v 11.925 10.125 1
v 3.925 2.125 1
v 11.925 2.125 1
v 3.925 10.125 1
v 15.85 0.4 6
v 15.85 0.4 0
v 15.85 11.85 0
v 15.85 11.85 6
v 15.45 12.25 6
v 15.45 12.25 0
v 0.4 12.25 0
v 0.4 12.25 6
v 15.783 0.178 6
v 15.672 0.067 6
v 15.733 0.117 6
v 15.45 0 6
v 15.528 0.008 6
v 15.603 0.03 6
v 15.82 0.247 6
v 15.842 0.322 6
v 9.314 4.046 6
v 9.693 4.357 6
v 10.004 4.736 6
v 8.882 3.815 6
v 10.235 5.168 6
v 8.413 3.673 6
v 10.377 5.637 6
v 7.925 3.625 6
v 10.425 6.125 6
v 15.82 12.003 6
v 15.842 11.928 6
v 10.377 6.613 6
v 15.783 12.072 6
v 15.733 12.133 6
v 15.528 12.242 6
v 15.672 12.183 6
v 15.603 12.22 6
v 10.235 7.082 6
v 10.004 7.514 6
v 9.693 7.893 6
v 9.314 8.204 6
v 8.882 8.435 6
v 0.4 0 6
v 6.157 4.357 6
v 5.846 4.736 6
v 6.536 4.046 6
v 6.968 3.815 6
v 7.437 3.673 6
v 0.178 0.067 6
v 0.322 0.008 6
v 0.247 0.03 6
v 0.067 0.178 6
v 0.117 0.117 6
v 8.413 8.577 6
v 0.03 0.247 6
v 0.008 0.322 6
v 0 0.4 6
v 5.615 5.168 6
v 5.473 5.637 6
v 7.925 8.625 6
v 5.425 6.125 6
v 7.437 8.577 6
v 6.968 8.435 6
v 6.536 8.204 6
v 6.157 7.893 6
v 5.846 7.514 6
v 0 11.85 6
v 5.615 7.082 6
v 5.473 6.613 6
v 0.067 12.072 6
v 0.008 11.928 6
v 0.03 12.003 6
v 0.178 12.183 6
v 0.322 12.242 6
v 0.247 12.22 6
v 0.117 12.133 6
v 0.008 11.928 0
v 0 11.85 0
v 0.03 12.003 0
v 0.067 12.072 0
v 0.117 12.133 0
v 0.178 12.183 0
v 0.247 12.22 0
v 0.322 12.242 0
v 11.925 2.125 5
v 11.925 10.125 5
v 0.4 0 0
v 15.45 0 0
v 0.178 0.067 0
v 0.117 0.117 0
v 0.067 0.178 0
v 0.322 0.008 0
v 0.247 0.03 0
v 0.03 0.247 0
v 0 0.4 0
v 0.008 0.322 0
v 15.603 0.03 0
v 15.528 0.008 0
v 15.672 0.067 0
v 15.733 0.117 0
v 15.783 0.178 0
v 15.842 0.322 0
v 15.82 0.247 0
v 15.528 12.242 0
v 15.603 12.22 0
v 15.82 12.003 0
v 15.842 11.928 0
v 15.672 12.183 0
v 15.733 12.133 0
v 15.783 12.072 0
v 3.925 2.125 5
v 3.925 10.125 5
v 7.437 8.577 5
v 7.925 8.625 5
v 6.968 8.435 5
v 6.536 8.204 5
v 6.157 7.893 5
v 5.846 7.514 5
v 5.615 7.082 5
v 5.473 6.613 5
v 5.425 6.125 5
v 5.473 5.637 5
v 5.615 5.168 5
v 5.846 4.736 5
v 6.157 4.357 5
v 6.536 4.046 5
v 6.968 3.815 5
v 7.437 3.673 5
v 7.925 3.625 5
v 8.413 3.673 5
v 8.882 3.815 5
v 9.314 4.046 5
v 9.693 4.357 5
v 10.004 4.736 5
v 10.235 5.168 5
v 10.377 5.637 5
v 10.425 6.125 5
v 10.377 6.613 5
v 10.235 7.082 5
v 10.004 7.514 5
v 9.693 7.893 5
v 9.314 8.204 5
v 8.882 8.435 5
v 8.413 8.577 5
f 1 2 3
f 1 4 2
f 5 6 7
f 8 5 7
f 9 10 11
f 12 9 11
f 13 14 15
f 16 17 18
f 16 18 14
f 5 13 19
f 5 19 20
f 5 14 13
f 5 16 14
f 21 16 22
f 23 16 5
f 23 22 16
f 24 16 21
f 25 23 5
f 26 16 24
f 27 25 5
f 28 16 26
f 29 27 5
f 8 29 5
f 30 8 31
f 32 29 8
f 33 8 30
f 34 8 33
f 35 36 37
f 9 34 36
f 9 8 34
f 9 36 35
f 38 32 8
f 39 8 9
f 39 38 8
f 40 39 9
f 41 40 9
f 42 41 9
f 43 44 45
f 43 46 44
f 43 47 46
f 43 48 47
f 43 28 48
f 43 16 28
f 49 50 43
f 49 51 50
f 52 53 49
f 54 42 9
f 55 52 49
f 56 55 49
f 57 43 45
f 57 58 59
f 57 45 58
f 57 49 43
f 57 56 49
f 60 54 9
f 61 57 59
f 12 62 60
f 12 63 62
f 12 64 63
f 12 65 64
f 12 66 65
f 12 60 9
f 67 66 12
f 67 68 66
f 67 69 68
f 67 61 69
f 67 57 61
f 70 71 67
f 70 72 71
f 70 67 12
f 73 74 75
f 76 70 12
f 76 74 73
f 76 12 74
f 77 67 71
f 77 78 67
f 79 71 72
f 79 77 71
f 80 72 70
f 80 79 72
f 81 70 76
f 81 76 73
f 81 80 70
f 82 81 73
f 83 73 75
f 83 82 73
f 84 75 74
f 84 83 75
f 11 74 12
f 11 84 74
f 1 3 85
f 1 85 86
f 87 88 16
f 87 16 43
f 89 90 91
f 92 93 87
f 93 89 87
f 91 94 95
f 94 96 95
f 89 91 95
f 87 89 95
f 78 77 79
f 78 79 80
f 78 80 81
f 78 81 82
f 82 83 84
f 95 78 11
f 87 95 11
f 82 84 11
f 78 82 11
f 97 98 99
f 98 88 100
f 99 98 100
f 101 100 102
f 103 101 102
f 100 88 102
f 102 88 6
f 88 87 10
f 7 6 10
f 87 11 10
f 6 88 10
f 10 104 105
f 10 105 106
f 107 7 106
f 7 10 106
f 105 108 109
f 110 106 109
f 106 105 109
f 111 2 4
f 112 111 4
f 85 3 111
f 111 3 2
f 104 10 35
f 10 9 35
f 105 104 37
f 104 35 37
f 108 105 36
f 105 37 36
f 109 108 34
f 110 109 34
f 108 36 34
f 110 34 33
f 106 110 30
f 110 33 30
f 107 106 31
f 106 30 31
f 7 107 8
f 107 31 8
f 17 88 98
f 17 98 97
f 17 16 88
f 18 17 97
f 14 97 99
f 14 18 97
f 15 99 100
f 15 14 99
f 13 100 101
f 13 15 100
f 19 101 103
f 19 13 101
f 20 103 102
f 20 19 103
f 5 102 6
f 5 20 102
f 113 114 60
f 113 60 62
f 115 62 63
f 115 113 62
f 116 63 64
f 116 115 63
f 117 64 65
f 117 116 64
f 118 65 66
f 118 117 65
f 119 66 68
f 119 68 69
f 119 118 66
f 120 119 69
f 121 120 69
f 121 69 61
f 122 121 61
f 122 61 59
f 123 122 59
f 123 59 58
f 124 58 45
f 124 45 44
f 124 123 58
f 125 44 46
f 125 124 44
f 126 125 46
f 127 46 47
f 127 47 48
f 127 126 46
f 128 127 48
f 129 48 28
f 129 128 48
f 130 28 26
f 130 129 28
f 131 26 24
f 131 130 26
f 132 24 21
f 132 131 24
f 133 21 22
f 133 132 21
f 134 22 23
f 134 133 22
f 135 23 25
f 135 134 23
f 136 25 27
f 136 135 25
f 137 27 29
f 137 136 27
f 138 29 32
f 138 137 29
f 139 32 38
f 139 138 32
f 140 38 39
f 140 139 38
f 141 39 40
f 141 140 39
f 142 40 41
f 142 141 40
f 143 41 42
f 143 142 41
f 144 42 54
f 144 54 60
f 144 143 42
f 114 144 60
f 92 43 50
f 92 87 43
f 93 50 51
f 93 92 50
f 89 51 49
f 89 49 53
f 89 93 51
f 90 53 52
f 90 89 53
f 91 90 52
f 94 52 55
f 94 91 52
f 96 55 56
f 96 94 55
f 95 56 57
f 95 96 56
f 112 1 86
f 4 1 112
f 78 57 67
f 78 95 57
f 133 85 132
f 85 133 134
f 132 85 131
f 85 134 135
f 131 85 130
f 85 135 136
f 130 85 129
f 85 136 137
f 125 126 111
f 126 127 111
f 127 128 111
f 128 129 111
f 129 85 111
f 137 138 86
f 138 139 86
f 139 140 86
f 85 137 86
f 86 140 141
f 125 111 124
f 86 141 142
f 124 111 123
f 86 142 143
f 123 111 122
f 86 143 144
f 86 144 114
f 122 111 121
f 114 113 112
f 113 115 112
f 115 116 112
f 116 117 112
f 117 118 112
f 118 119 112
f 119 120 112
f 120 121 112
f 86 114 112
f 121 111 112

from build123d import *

# Parameters (mm, degrees)
FACE001_W        = 12.25
FACE001_H        = 15.85
FACE001_W_2      = 8
FACE001_H_2      = 8
EXTRUDE001_DEPTH = 4
SKETCH_W         = 15.85
SKETCH_H         = 12.25
EXTRUDE_DEPTH    = 1
FACE002_W        = 12.25
FACE002_H        = 15.85
FACE002_R        = 2.5
EXTRUDE002_DEPTH = 1
FILLET_R         = 0.4


with BuildPart() as extrude001:
    # Face001 → Extrude001 (new body)
    with BuildSketch(Plane(origin=(7.925, 6.125, 1), x_dir=(0, 1, 0), z_dir=(0, 0, 1))):
        Rectangle(FACE001_W, FACE001_H)
        Rectangle(FACE001_W_2, FACE001_H_2, mode=Mode.SUBTRACT)
    extrude(amount=EXTRUDE001_DEPTH)


with BuildPart() as fusion:
    # Sketch → Extrude (new body)
    with BuildSketch(Plane.XY):
        with Locations((7.925, 6.125)):
            Rectangle(SKETCH_W, SKETCH_H)
    extrude(amount=EXTRUDE_DEPTH)

    # Fusion: union Extrude001
    add(extrude001.part)


with BuildPart() as fillet_body:
    # Face002 → Extrude002 (new body)
    with BuildSketch(Plane(origin=(7.925, 6.125, 5), x_dir=(0, 1, 0), z_dir=(0, 0, 1))):
        Rectangle(FACE002_W, FACE002_H)
        Circle(FACE002_R, mode=Mode.SUBTRACT)
    extrude(amount=EXTRUDE002_DEPTH)

    # Fusion001: union Fusion
    add(fusion.part)

    # Fillet
    fillet_edges = [fillet_body.edges().sort_by_distance(p)[0] for p in [
        (15.85, 12.25, 5.5),
        (0, 12.25, 5.5),
        (15.85, 0, 5.5),
        (0, 0, 5.5),
        (15.85, 12.25, 3),
        (0, 12.25, 3),
        (15.85, 0, 3),
        (0, 0, 3),
        (15.85, 12.25, 0.5),
        (0, 12.25, 0.5),
        (15.85, 0, 0.5),
        (0, 0, 0.5),
    ]]
    fillet(fillet_edges, radius=FILLET_R)


solid = fillet_body.part
